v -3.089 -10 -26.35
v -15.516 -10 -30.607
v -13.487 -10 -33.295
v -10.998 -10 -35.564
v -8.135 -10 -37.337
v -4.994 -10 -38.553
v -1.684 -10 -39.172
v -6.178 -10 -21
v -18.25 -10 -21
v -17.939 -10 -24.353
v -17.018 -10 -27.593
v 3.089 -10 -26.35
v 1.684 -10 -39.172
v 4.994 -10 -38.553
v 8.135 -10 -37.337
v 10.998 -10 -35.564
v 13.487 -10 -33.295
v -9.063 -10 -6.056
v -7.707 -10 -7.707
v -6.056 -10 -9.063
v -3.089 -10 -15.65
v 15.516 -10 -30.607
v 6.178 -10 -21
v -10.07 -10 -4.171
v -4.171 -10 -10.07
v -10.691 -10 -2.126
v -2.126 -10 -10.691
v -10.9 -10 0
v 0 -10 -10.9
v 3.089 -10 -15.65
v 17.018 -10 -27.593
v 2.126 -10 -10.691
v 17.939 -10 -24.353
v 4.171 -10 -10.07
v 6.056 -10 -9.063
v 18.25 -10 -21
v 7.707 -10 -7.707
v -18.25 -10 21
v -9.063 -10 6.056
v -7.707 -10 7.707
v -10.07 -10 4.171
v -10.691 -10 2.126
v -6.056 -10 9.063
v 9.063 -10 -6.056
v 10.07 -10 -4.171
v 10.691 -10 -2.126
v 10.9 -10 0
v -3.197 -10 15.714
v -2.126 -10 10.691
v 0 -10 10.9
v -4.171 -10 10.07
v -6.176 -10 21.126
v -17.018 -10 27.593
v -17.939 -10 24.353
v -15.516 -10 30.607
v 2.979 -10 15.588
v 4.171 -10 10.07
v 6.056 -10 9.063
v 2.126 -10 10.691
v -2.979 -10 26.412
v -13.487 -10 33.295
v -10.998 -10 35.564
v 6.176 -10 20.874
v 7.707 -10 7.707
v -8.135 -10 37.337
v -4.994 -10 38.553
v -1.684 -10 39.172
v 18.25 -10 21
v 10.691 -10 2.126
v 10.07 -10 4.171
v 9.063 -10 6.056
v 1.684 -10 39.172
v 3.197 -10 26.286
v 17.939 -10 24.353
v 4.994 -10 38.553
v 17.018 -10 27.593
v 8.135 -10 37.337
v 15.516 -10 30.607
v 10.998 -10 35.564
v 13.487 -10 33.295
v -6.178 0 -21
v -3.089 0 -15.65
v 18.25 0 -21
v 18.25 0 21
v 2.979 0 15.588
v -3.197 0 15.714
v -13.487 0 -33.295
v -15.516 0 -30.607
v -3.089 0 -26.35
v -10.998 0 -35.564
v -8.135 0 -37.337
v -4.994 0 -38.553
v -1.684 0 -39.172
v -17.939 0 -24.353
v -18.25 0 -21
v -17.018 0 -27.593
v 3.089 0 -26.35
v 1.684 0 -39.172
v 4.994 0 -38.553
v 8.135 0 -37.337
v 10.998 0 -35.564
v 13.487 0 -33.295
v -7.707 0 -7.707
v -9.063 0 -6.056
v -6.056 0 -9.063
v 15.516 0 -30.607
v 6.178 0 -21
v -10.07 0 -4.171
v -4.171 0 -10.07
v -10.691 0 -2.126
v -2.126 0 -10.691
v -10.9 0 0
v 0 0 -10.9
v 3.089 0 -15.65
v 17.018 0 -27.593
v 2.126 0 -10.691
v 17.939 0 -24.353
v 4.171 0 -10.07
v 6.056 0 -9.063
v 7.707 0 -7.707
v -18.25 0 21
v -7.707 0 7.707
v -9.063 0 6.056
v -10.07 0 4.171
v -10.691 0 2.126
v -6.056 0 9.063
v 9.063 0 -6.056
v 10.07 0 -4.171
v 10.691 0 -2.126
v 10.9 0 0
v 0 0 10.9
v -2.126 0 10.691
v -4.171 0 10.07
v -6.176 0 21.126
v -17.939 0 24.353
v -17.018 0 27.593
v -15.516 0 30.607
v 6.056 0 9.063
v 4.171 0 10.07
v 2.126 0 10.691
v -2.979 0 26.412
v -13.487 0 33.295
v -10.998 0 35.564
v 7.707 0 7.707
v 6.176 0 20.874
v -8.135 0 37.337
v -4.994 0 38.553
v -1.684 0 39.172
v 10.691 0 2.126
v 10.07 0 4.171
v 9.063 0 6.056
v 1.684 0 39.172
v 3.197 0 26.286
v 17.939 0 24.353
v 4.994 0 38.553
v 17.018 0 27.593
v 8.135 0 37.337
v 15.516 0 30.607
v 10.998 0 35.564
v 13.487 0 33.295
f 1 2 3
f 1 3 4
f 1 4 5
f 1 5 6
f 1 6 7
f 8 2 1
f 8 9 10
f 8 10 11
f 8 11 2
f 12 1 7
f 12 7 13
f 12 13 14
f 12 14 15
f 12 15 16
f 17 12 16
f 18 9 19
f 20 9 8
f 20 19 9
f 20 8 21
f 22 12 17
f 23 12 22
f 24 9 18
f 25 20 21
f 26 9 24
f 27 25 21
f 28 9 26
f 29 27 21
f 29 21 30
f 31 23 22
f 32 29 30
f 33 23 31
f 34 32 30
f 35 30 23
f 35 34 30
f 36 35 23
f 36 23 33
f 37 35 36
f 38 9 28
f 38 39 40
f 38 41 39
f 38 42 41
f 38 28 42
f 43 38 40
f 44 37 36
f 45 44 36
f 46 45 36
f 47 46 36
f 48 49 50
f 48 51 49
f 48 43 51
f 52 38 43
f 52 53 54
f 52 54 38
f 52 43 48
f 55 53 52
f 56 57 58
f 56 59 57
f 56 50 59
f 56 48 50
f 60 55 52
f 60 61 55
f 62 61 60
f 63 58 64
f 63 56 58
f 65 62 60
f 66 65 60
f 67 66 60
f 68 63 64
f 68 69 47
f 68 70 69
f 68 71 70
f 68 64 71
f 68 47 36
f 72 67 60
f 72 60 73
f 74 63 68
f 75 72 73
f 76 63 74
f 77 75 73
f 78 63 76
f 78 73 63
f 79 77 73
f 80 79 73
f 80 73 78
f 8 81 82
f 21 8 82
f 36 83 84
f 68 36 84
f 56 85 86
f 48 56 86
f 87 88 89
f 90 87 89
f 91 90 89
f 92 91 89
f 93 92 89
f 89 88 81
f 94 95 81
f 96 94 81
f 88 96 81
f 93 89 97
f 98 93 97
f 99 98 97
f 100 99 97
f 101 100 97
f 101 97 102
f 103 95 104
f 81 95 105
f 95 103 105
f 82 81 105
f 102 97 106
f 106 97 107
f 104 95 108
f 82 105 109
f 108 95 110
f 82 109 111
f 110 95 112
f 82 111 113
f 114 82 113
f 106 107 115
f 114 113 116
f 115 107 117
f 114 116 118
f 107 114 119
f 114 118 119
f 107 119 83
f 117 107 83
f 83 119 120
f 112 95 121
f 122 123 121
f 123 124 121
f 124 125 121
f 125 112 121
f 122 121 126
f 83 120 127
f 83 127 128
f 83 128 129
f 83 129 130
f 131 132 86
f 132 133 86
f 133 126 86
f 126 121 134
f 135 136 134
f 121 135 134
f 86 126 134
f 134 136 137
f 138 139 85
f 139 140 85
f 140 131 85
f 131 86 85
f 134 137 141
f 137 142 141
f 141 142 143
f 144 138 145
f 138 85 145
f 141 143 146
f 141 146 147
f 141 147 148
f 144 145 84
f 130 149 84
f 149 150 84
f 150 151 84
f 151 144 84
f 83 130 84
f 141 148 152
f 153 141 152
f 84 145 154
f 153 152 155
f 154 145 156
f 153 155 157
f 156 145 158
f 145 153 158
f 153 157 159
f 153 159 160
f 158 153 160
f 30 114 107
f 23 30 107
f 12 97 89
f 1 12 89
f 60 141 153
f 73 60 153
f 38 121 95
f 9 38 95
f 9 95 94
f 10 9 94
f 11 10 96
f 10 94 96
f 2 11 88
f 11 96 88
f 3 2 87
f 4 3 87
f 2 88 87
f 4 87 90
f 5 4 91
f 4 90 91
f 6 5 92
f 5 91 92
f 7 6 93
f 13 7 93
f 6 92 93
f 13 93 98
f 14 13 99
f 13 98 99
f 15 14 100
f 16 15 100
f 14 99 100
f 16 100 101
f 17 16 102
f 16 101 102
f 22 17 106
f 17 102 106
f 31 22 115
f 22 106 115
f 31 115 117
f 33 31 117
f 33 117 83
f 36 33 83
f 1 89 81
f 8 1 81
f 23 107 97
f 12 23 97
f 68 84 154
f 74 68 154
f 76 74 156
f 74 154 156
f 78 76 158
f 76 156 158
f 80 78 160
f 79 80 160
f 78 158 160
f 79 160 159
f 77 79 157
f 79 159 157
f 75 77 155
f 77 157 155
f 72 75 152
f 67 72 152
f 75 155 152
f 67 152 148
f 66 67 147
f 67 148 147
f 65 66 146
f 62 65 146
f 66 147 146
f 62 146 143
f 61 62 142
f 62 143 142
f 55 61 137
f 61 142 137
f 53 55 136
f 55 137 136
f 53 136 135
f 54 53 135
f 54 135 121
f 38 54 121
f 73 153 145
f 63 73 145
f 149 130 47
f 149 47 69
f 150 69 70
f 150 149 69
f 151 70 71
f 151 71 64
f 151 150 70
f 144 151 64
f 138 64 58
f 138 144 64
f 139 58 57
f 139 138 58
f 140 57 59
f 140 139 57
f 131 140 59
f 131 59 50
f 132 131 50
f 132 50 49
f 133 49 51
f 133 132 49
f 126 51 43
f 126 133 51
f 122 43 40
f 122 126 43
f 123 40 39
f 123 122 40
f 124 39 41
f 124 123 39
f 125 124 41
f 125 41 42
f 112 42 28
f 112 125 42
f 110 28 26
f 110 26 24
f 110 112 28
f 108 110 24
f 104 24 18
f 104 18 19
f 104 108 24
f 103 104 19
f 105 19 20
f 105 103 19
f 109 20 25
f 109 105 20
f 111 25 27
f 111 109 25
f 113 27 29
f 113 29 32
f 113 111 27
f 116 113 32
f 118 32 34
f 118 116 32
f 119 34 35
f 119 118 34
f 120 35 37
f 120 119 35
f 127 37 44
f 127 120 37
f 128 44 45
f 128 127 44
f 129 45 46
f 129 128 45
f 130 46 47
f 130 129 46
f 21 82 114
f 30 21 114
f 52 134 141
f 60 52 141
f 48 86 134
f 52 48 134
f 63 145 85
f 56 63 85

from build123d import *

# Parameters (mm, degrees)
F0_R     = 10.9
F1_DEPTH = 10


with BuildPart() as f1:
    # F0 (on Front) → F1 (new body)
    with BuildSketch(Plane.XZ):
        with BuildLine():
            Line((-18.25, 21), (-18.25, -21))
            ThreePointArc((-18.25, -21), (0, -39.25), (18.25, -21))
            Line((18.25, -21), (18.25, 21))
            ThreePointArc((18.25, 21), (0, 39.25), (-18.25, 21))
        make_face()
        Polygon((-6.177648, -21), (-3.088824, -15.65), (3.088824, -15.65), (6.177648, -21), (3.088824, -26.35), (-3.088824, -26.35), align=None, mode=Mode.SUBTRACT)
        Polygon((-2.979001, 26.411921), (3.19736, 26.285851), (6.176361, 20.87393), (2.979001, 15.588079), (-3.19736, 15.714149), (-6.176361, 21.12607), align=None, mode=Mode.SUBTRACT)
        Circle(F0_R, mode=Mode.SUBTRACT)
    extrude(amount=F1_DEPTH)


solid = f1.part
